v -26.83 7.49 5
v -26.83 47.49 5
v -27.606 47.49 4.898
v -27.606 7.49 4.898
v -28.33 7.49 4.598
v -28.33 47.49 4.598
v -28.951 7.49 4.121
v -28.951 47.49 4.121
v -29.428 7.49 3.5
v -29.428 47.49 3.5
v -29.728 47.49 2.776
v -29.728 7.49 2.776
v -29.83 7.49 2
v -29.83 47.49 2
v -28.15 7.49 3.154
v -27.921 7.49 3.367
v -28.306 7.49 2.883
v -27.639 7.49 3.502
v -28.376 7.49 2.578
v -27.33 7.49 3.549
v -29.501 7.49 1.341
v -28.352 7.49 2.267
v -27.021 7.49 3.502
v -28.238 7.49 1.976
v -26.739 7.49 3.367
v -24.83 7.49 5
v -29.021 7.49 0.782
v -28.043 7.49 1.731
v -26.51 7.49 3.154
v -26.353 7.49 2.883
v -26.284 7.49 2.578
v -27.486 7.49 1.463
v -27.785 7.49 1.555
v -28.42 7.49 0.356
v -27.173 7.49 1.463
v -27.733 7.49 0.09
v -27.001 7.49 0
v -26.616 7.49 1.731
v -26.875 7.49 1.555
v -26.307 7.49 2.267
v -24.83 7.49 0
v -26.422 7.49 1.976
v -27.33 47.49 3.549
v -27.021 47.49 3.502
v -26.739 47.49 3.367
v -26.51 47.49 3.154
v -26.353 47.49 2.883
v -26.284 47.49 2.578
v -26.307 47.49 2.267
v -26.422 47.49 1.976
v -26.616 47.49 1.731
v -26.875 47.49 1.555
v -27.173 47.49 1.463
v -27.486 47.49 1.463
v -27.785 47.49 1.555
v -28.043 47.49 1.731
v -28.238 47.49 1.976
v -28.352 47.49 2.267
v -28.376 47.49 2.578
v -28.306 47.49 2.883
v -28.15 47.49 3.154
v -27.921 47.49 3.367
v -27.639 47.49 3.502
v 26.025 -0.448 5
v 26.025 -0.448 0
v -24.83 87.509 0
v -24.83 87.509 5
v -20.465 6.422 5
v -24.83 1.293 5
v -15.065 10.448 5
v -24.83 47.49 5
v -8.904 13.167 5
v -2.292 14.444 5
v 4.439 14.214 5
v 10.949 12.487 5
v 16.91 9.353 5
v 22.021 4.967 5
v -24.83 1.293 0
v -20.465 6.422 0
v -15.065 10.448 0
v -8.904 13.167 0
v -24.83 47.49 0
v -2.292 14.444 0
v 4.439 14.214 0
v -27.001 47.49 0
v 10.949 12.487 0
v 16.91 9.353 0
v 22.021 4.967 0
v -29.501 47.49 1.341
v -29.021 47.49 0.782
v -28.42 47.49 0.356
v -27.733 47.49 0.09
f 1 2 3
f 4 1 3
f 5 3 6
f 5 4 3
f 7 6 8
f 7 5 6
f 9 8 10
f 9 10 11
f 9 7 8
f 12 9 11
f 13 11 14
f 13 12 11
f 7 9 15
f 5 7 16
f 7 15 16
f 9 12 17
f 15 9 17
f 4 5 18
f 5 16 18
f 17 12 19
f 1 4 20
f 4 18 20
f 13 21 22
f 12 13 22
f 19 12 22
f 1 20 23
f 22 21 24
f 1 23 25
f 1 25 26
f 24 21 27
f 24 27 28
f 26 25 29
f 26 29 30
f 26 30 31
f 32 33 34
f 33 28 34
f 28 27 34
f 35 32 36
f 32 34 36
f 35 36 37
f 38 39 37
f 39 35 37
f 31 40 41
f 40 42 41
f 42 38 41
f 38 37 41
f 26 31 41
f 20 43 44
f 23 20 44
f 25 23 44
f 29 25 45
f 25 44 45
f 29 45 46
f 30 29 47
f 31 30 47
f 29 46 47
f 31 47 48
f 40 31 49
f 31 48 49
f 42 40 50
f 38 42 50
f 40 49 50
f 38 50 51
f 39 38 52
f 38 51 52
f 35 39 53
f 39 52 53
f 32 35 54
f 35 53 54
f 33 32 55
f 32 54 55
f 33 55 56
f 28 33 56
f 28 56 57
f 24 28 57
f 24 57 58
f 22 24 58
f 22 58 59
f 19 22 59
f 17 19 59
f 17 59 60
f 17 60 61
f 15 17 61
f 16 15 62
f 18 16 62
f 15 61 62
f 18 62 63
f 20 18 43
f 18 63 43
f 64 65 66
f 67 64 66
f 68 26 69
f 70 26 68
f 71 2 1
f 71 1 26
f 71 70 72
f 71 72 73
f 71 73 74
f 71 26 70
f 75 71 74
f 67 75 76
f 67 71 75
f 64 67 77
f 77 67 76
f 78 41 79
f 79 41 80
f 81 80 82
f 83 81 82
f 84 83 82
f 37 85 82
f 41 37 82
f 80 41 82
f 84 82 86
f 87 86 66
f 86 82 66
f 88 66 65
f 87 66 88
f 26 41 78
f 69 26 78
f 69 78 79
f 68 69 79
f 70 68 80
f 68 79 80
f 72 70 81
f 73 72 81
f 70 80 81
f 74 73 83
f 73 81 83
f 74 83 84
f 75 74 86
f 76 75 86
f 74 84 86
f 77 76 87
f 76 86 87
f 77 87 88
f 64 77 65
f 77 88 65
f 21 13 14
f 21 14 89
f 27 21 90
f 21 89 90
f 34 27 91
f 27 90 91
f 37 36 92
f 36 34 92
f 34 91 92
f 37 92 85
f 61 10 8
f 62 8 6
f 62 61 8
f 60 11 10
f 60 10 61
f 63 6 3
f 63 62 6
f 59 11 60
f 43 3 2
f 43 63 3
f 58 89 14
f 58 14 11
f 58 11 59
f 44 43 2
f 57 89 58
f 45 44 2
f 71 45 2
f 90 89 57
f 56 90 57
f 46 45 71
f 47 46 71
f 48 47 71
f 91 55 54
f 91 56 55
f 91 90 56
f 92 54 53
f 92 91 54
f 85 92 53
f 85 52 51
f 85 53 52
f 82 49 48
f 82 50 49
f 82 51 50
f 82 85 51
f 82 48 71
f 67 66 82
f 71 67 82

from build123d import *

# Parameters (mm, degrees)
BOSS_EXTRU_1_DEPTH      = 5
ESQUISSE9_W             = 5
ESQUISSE9_H             = 5
BOSS_EXTRU_3_DEPTH      = 40
ESQUISSE12_R            = 1.048820472
ENL_V_MAT_EXTRU_3_DEPTH = 40
CONG_3_R                = 3
CONG_4_R                = 3


with BuildPart() as part:
    # Esquisse1 → Boss.-Extru.1 (new body)
    with BuildSketch(Plane.XY):
        with BuildLine():
            Line((26.025021052, -0.447992933), (-24.829805977, 87.508811894))
            Line((-24.829805977, 87.508811894), (-24.829805977, 1.293439737))
            ThreePointArc((-24.829805977, 1.293439737), (1.080284786, 14.518282983), (26.025021052, -0.447992933))
        make_face()
    extrude(amount=BOSS_EXTRU_1_DEPTH)

    # Esquisse9 → Boss.-Extru.3 (add)
    with BuildSketch(Plane(origin=(0, 47.4898845, 0), x_dir=(1, 0, 0), z_dir=(0, 1, 0))):
        with Locations((-27.329805977, -2.5)):
            Rectangle(ESQUISSE9_W, ESQUISSE9_H)
    extrude(amount=-BOSS_EXTRU_3_DEPTH)

    # Esquisse12 → Enlèv. mat.-Extru.3 (cut)
    with BuildSketch(Plane(origin=(0, 47.4898845, 0), x_dir=(1, 0, 0), z_dir=(0, 1, 0))):
        with Locations(Location((-27.329805977, -2.5, 0), (0, 0, 270))):
            Circle(ESQUISSE12_R)
    extrude(amount=-ENL_V_MAT_EXTRU_3_DEPTH, mode=Mode.SUBTRACT)

    # Congé3
    cong_3_edges = [part.edges().sort_by_distance(p)[0] for p in [
        (-29.829805977, 27.4898845, 5),
    ]]
    fillet(cong_3_edges, radius=CONG_3_R)

    # Congé4
    # the kernel refuses this fillet: 3 mm, written as the material it takes off along each edge
    with BuildSketch(Plane(origin=(-29.829805977, 54.560952312, 0), x_dir=(0, 0, 1), z_dir=(0, -1, 0))) as cong_4_piece_1:
        with BuildLine():
            CenterArc((3, -2.828427125), CONG_4_R, 109.471220634, 70.528779366)
            Line((0, -2.828427125), (-0.06, -2.828427125))
            Line((-0.06, -2.828427125), (-0.06, 0))
            Line((-0.06, 0), (0, 0.06))
            ThreePointArc((0, 0.06), (1, 0.06), (1.98, 0.056568542))
            Line((1.98, 0.056568542), (2, 0))
        make_face()
    extrude(amount=54.142135624, mode=Mode.SUBTRACT)


solid = part.part
